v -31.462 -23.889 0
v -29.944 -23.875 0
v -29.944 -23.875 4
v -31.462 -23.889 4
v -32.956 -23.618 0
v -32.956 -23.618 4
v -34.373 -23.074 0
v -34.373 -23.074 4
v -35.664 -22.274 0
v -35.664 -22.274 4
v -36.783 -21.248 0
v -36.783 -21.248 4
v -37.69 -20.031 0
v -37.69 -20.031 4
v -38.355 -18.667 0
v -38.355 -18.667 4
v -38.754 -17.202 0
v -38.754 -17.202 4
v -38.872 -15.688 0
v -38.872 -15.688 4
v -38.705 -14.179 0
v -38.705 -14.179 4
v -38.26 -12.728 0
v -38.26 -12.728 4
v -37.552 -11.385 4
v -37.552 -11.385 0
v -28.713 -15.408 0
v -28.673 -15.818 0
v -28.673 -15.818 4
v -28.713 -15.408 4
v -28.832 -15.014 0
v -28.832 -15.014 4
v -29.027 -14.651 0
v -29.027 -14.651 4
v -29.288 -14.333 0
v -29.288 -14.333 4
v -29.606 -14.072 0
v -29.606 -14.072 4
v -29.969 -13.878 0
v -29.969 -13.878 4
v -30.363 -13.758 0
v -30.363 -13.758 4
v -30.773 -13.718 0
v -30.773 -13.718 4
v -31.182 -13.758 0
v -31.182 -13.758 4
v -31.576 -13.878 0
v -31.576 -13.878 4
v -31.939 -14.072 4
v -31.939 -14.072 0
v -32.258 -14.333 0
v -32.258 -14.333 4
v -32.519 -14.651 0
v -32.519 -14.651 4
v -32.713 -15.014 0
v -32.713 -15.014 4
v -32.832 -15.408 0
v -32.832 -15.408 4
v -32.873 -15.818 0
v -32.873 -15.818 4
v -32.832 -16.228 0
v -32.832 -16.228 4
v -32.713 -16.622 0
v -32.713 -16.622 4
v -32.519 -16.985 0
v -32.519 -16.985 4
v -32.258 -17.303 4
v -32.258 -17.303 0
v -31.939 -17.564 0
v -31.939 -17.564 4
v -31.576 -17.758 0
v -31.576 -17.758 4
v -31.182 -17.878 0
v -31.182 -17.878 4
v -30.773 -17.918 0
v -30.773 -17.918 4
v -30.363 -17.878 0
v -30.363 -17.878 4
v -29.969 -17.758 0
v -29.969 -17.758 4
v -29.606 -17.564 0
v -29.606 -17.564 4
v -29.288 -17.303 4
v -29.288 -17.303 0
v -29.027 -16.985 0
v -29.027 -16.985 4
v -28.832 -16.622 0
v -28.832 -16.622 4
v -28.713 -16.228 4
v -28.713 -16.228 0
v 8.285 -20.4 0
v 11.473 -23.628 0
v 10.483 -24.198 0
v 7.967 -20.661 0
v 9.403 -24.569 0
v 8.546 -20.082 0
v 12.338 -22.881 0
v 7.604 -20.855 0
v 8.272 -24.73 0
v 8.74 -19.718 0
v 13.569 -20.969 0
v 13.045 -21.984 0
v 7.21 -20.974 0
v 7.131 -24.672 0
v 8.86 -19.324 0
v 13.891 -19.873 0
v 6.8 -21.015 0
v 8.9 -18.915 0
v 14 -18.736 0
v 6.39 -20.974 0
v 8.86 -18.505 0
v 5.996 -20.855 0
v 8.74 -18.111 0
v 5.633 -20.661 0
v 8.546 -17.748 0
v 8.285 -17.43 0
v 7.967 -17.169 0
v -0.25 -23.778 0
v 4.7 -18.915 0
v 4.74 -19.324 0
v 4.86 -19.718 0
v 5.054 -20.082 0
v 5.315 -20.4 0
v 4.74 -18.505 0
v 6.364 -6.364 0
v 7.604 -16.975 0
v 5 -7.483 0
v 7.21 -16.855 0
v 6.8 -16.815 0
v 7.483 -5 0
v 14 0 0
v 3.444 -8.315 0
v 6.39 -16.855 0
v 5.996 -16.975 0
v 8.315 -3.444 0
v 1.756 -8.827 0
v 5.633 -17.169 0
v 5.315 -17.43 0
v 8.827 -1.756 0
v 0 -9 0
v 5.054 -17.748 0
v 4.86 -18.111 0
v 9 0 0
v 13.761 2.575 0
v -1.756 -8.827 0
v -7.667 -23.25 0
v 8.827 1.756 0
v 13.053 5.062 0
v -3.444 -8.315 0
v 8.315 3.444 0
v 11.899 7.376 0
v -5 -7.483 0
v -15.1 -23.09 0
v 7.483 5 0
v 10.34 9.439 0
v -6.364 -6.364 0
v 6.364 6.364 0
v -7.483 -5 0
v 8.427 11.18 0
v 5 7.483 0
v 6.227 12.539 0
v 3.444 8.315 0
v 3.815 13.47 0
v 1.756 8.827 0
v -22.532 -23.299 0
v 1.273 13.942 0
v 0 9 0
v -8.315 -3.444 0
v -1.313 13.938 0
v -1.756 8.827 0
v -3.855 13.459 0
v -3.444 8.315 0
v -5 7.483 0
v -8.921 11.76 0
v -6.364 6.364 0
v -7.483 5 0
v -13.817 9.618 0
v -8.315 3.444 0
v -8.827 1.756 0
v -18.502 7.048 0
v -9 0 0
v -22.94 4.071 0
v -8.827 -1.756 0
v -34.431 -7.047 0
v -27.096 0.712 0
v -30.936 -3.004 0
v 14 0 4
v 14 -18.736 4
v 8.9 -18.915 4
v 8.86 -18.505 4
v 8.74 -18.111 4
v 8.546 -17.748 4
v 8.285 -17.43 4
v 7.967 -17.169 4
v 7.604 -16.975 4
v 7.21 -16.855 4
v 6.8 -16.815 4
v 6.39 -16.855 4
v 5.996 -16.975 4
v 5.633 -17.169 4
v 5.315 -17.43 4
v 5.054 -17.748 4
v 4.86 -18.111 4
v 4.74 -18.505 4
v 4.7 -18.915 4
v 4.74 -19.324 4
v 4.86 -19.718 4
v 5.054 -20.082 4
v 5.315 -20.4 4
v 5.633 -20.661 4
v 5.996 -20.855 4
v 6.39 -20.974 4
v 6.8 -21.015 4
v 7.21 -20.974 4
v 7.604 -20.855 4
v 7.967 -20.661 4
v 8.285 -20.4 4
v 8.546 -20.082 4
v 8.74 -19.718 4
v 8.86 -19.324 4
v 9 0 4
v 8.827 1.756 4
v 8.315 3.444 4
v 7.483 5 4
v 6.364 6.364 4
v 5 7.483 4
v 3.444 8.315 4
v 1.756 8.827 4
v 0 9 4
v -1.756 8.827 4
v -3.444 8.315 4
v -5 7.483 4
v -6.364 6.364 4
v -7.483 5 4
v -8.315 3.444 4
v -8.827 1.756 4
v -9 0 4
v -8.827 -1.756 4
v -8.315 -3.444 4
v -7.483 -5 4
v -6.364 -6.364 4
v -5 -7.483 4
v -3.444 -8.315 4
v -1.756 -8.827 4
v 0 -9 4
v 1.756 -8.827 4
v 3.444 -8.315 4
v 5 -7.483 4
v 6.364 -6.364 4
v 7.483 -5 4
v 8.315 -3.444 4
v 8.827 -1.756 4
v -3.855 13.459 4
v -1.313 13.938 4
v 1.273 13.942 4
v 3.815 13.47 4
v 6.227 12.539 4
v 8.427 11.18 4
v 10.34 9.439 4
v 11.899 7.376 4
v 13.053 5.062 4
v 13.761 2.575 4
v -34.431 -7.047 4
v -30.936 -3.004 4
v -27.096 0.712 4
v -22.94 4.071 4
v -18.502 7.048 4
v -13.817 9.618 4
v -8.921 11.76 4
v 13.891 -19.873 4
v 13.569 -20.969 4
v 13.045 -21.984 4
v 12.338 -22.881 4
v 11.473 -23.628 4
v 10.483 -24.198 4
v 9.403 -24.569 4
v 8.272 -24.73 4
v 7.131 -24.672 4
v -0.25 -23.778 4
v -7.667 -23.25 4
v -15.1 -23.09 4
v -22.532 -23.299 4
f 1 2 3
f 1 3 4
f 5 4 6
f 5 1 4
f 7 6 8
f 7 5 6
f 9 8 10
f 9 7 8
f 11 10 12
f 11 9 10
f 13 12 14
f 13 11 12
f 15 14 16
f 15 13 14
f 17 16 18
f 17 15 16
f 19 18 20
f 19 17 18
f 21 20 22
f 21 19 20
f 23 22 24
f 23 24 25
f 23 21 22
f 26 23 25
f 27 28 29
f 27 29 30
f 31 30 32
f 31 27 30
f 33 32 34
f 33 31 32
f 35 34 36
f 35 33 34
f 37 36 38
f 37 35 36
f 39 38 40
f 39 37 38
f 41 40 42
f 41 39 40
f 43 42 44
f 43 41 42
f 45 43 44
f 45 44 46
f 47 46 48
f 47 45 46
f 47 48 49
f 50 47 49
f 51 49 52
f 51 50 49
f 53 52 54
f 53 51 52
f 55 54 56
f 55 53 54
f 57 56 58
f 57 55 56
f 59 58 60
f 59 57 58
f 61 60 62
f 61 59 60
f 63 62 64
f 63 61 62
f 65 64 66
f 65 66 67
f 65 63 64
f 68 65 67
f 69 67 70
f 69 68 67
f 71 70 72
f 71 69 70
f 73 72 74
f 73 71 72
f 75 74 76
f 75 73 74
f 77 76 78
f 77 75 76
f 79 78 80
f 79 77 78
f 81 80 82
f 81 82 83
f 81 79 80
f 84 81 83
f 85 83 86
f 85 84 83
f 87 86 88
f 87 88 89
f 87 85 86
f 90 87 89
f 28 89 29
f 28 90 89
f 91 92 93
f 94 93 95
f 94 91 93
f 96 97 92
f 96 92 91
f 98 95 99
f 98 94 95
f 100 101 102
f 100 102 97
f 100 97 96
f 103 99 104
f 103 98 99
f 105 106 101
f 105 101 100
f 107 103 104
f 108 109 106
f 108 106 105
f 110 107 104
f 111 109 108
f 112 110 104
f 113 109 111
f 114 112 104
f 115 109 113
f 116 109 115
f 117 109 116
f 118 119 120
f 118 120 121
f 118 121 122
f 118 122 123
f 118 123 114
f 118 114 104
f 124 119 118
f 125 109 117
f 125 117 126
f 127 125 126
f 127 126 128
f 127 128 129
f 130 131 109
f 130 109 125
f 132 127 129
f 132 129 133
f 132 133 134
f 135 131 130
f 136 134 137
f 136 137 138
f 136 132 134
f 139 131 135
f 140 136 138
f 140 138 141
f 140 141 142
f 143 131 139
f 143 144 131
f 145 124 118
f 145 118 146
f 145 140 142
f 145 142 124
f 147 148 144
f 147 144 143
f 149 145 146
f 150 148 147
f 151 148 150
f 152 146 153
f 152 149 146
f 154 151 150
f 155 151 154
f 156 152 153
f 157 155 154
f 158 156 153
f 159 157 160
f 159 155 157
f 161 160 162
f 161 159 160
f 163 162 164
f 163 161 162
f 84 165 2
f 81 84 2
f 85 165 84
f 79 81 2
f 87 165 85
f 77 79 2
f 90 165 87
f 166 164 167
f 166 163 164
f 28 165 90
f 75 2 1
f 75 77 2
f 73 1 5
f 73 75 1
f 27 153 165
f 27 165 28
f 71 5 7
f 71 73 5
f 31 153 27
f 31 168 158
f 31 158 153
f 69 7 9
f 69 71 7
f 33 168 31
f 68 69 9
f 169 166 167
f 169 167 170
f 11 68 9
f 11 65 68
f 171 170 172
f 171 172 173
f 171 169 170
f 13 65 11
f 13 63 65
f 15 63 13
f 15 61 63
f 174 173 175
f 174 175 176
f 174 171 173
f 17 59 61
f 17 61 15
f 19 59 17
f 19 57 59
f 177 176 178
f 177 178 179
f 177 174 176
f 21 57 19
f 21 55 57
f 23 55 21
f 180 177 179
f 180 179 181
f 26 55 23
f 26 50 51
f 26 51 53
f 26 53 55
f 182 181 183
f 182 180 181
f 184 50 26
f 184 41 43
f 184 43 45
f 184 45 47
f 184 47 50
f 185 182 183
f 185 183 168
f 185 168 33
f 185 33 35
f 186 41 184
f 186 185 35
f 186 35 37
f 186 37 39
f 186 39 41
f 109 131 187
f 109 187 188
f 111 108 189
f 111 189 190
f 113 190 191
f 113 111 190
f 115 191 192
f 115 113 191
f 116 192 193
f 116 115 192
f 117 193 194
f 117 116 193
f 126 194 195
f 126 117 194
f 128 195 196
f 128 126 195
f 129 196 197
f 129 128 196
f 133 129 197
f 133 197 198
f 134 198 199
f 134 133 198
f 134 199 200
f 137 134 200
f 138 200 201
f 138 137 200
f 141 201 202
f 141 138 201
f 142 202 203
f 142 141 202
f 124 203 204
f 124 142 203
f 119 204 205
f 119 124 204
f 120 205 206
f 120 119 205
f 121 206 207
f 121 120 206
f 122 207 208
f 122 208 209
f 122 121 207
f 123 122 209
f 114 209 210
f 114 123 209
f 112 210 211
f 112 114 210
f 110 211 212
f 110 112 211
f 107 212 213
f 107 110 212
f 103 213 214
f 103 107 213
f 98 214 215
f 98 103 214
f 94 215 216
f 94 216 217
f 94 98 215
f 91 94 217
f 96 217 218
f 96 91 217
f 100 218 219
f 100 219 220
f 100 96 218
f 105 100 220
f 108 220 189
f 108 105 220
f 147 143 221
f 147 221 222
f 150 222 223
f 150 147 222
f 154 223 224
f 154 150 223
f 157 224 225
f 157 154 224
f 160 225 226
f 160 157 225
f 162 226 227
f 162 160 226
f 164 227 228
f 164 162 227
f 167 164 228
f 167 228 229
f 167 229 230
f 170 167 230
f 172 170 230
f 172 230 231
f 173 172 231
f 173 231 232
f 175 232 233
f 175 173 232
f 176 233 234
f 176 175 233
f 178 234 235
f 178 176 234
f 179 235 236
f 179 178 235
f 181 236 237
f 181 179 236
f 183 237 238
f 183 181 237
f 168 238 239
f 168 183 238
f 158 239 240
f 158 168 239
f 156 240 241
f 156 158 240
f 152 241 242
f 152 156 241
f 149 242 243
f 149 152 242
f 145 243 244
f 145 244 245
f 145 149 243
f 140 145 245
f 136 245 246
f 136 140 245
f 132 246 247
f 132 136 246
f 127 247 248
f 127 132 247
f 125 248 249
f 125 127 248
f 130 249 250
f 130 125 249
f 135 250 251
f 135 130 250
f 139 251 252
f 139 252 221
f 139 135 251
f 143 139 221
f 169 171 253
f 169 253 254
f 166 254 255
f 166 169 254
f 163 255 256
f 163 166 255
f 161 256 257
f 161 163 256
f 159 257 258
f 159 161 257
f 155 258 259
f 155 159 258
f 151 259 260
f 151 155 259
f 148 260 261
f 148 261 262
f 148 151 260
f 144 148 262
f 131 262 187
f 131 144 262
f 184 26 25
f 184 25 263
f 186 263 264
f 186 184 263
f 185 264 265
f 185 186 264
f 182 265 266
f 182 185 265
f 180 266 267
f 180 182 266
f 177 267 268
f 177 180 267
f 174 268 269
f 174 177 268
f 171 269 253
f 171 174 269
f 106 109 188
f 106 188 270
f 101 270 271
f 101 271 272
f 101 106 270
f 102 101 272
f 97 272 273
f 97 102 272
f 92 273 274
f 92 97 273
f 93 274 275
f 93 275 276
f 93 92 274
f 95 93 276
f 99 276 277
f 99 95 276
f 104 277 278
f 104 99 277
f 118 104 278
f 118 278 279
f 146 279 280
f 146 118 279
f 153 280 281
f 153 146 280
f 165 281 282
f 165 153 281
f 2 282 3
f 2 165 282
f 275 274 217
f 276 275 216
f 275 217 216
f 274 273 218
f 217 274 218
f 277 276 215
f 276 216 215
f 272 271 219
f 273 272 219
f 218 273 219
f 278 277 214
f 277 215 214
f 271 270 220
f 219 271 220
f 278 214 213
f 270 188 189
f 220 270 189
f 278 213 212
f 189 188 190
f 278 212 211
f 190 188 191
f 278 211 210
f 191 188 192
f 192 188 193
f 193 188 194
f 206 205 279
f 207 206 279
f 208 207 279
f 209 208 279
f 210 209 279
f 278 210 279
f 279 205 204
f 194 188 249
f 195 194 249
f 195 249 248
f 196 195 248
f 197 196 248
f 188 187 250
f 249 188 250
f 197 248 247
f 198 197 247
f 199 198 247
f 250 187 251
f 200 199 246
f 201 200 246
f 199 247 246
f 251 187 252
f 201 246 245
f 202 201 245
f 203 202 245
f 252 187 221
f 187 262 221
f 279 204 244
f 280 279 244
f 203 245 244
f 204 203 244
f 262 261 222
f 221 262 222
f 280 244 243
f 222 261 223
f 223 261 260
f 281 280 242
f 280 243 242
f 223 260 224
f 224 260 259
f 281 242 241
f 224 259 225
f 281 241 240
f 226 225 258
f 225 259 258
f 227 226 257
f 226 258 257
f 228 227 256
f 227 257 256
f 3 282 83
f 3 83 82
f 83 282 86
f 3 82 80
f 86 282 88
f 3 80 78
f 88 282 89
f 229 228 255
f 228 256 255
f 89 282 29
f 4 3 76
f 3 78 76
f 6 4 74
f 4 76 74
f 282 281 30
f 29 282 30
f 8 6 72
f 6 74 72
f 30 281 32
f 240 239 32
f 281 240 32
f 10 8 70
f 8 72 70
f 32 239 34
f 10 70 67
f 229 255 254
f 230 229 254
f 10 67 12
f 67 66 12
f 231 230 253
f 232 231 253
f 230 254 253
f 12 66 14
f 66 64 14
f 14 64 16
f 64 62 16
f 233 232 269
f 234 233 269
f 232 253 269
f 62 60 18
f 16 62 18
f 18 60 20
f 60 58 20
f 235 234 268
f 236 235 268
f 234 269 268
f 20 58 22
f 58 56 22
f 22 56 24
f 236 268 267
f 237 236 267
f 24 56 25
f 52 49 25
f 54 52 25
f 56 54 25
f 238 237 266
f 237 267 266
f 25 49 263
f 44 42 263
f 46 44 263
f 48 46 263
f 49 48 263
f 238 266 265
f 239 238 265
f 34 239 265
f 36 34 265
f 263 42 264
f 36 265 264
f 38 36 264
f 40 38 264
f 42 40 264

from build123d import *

# Parameters (mm, degrees)
ESQUISSE1_R        = 9
ESQUISSE1_R_2      = 2.1
BOSS_EXTRU_1_DEPTH = 4


with BuildPart() as part:
    # Esquisse1 → Boss.-Extru.1 (new body)
    with BuildSketch(Plane.XY):
        with BuildLine():
            Line((14, 0), (14, -18.735720858))
            ThreePointArc((14, -18.735720858), (11.923221563, -23.275360995), (7.13055581, -24.672392215))
            ThreePointArc((7.13055581, -24.672392215), (-11.382149549, -23.123814483), (-29.944297321, -23.875494465))
            ThreePointArc((-29.944297321, -23.875494465), (-37.690469305, -20.031379706), (-37.551840307, -11.384924901))
            ThreePointArc((-37.551840307, -11.384924901), (-22.940340069, 4.071410465), (-3.854513663, 13.458927313))
            ThreePointArc((-3.854513663, 13.458927313), (8.4272418, 11.179516789), (14, 0))
        make_face()
        Circle(ESQUISSE1_R, mode=Mode.SUBTRACT)
        with Locations((6.8, -18.914809013)):
            Circle(ESQUISSE1_R_2, mode=Mode.SUBTRACT)
        with Locations((-30.772589733, -15.817955655)):
            Circle(ESQUISSE1_R_2, mode=Mode.SUBTRACT)
    extrude(amount=BOSS_EXTRU_1_DEPTH)


solid = part.part
